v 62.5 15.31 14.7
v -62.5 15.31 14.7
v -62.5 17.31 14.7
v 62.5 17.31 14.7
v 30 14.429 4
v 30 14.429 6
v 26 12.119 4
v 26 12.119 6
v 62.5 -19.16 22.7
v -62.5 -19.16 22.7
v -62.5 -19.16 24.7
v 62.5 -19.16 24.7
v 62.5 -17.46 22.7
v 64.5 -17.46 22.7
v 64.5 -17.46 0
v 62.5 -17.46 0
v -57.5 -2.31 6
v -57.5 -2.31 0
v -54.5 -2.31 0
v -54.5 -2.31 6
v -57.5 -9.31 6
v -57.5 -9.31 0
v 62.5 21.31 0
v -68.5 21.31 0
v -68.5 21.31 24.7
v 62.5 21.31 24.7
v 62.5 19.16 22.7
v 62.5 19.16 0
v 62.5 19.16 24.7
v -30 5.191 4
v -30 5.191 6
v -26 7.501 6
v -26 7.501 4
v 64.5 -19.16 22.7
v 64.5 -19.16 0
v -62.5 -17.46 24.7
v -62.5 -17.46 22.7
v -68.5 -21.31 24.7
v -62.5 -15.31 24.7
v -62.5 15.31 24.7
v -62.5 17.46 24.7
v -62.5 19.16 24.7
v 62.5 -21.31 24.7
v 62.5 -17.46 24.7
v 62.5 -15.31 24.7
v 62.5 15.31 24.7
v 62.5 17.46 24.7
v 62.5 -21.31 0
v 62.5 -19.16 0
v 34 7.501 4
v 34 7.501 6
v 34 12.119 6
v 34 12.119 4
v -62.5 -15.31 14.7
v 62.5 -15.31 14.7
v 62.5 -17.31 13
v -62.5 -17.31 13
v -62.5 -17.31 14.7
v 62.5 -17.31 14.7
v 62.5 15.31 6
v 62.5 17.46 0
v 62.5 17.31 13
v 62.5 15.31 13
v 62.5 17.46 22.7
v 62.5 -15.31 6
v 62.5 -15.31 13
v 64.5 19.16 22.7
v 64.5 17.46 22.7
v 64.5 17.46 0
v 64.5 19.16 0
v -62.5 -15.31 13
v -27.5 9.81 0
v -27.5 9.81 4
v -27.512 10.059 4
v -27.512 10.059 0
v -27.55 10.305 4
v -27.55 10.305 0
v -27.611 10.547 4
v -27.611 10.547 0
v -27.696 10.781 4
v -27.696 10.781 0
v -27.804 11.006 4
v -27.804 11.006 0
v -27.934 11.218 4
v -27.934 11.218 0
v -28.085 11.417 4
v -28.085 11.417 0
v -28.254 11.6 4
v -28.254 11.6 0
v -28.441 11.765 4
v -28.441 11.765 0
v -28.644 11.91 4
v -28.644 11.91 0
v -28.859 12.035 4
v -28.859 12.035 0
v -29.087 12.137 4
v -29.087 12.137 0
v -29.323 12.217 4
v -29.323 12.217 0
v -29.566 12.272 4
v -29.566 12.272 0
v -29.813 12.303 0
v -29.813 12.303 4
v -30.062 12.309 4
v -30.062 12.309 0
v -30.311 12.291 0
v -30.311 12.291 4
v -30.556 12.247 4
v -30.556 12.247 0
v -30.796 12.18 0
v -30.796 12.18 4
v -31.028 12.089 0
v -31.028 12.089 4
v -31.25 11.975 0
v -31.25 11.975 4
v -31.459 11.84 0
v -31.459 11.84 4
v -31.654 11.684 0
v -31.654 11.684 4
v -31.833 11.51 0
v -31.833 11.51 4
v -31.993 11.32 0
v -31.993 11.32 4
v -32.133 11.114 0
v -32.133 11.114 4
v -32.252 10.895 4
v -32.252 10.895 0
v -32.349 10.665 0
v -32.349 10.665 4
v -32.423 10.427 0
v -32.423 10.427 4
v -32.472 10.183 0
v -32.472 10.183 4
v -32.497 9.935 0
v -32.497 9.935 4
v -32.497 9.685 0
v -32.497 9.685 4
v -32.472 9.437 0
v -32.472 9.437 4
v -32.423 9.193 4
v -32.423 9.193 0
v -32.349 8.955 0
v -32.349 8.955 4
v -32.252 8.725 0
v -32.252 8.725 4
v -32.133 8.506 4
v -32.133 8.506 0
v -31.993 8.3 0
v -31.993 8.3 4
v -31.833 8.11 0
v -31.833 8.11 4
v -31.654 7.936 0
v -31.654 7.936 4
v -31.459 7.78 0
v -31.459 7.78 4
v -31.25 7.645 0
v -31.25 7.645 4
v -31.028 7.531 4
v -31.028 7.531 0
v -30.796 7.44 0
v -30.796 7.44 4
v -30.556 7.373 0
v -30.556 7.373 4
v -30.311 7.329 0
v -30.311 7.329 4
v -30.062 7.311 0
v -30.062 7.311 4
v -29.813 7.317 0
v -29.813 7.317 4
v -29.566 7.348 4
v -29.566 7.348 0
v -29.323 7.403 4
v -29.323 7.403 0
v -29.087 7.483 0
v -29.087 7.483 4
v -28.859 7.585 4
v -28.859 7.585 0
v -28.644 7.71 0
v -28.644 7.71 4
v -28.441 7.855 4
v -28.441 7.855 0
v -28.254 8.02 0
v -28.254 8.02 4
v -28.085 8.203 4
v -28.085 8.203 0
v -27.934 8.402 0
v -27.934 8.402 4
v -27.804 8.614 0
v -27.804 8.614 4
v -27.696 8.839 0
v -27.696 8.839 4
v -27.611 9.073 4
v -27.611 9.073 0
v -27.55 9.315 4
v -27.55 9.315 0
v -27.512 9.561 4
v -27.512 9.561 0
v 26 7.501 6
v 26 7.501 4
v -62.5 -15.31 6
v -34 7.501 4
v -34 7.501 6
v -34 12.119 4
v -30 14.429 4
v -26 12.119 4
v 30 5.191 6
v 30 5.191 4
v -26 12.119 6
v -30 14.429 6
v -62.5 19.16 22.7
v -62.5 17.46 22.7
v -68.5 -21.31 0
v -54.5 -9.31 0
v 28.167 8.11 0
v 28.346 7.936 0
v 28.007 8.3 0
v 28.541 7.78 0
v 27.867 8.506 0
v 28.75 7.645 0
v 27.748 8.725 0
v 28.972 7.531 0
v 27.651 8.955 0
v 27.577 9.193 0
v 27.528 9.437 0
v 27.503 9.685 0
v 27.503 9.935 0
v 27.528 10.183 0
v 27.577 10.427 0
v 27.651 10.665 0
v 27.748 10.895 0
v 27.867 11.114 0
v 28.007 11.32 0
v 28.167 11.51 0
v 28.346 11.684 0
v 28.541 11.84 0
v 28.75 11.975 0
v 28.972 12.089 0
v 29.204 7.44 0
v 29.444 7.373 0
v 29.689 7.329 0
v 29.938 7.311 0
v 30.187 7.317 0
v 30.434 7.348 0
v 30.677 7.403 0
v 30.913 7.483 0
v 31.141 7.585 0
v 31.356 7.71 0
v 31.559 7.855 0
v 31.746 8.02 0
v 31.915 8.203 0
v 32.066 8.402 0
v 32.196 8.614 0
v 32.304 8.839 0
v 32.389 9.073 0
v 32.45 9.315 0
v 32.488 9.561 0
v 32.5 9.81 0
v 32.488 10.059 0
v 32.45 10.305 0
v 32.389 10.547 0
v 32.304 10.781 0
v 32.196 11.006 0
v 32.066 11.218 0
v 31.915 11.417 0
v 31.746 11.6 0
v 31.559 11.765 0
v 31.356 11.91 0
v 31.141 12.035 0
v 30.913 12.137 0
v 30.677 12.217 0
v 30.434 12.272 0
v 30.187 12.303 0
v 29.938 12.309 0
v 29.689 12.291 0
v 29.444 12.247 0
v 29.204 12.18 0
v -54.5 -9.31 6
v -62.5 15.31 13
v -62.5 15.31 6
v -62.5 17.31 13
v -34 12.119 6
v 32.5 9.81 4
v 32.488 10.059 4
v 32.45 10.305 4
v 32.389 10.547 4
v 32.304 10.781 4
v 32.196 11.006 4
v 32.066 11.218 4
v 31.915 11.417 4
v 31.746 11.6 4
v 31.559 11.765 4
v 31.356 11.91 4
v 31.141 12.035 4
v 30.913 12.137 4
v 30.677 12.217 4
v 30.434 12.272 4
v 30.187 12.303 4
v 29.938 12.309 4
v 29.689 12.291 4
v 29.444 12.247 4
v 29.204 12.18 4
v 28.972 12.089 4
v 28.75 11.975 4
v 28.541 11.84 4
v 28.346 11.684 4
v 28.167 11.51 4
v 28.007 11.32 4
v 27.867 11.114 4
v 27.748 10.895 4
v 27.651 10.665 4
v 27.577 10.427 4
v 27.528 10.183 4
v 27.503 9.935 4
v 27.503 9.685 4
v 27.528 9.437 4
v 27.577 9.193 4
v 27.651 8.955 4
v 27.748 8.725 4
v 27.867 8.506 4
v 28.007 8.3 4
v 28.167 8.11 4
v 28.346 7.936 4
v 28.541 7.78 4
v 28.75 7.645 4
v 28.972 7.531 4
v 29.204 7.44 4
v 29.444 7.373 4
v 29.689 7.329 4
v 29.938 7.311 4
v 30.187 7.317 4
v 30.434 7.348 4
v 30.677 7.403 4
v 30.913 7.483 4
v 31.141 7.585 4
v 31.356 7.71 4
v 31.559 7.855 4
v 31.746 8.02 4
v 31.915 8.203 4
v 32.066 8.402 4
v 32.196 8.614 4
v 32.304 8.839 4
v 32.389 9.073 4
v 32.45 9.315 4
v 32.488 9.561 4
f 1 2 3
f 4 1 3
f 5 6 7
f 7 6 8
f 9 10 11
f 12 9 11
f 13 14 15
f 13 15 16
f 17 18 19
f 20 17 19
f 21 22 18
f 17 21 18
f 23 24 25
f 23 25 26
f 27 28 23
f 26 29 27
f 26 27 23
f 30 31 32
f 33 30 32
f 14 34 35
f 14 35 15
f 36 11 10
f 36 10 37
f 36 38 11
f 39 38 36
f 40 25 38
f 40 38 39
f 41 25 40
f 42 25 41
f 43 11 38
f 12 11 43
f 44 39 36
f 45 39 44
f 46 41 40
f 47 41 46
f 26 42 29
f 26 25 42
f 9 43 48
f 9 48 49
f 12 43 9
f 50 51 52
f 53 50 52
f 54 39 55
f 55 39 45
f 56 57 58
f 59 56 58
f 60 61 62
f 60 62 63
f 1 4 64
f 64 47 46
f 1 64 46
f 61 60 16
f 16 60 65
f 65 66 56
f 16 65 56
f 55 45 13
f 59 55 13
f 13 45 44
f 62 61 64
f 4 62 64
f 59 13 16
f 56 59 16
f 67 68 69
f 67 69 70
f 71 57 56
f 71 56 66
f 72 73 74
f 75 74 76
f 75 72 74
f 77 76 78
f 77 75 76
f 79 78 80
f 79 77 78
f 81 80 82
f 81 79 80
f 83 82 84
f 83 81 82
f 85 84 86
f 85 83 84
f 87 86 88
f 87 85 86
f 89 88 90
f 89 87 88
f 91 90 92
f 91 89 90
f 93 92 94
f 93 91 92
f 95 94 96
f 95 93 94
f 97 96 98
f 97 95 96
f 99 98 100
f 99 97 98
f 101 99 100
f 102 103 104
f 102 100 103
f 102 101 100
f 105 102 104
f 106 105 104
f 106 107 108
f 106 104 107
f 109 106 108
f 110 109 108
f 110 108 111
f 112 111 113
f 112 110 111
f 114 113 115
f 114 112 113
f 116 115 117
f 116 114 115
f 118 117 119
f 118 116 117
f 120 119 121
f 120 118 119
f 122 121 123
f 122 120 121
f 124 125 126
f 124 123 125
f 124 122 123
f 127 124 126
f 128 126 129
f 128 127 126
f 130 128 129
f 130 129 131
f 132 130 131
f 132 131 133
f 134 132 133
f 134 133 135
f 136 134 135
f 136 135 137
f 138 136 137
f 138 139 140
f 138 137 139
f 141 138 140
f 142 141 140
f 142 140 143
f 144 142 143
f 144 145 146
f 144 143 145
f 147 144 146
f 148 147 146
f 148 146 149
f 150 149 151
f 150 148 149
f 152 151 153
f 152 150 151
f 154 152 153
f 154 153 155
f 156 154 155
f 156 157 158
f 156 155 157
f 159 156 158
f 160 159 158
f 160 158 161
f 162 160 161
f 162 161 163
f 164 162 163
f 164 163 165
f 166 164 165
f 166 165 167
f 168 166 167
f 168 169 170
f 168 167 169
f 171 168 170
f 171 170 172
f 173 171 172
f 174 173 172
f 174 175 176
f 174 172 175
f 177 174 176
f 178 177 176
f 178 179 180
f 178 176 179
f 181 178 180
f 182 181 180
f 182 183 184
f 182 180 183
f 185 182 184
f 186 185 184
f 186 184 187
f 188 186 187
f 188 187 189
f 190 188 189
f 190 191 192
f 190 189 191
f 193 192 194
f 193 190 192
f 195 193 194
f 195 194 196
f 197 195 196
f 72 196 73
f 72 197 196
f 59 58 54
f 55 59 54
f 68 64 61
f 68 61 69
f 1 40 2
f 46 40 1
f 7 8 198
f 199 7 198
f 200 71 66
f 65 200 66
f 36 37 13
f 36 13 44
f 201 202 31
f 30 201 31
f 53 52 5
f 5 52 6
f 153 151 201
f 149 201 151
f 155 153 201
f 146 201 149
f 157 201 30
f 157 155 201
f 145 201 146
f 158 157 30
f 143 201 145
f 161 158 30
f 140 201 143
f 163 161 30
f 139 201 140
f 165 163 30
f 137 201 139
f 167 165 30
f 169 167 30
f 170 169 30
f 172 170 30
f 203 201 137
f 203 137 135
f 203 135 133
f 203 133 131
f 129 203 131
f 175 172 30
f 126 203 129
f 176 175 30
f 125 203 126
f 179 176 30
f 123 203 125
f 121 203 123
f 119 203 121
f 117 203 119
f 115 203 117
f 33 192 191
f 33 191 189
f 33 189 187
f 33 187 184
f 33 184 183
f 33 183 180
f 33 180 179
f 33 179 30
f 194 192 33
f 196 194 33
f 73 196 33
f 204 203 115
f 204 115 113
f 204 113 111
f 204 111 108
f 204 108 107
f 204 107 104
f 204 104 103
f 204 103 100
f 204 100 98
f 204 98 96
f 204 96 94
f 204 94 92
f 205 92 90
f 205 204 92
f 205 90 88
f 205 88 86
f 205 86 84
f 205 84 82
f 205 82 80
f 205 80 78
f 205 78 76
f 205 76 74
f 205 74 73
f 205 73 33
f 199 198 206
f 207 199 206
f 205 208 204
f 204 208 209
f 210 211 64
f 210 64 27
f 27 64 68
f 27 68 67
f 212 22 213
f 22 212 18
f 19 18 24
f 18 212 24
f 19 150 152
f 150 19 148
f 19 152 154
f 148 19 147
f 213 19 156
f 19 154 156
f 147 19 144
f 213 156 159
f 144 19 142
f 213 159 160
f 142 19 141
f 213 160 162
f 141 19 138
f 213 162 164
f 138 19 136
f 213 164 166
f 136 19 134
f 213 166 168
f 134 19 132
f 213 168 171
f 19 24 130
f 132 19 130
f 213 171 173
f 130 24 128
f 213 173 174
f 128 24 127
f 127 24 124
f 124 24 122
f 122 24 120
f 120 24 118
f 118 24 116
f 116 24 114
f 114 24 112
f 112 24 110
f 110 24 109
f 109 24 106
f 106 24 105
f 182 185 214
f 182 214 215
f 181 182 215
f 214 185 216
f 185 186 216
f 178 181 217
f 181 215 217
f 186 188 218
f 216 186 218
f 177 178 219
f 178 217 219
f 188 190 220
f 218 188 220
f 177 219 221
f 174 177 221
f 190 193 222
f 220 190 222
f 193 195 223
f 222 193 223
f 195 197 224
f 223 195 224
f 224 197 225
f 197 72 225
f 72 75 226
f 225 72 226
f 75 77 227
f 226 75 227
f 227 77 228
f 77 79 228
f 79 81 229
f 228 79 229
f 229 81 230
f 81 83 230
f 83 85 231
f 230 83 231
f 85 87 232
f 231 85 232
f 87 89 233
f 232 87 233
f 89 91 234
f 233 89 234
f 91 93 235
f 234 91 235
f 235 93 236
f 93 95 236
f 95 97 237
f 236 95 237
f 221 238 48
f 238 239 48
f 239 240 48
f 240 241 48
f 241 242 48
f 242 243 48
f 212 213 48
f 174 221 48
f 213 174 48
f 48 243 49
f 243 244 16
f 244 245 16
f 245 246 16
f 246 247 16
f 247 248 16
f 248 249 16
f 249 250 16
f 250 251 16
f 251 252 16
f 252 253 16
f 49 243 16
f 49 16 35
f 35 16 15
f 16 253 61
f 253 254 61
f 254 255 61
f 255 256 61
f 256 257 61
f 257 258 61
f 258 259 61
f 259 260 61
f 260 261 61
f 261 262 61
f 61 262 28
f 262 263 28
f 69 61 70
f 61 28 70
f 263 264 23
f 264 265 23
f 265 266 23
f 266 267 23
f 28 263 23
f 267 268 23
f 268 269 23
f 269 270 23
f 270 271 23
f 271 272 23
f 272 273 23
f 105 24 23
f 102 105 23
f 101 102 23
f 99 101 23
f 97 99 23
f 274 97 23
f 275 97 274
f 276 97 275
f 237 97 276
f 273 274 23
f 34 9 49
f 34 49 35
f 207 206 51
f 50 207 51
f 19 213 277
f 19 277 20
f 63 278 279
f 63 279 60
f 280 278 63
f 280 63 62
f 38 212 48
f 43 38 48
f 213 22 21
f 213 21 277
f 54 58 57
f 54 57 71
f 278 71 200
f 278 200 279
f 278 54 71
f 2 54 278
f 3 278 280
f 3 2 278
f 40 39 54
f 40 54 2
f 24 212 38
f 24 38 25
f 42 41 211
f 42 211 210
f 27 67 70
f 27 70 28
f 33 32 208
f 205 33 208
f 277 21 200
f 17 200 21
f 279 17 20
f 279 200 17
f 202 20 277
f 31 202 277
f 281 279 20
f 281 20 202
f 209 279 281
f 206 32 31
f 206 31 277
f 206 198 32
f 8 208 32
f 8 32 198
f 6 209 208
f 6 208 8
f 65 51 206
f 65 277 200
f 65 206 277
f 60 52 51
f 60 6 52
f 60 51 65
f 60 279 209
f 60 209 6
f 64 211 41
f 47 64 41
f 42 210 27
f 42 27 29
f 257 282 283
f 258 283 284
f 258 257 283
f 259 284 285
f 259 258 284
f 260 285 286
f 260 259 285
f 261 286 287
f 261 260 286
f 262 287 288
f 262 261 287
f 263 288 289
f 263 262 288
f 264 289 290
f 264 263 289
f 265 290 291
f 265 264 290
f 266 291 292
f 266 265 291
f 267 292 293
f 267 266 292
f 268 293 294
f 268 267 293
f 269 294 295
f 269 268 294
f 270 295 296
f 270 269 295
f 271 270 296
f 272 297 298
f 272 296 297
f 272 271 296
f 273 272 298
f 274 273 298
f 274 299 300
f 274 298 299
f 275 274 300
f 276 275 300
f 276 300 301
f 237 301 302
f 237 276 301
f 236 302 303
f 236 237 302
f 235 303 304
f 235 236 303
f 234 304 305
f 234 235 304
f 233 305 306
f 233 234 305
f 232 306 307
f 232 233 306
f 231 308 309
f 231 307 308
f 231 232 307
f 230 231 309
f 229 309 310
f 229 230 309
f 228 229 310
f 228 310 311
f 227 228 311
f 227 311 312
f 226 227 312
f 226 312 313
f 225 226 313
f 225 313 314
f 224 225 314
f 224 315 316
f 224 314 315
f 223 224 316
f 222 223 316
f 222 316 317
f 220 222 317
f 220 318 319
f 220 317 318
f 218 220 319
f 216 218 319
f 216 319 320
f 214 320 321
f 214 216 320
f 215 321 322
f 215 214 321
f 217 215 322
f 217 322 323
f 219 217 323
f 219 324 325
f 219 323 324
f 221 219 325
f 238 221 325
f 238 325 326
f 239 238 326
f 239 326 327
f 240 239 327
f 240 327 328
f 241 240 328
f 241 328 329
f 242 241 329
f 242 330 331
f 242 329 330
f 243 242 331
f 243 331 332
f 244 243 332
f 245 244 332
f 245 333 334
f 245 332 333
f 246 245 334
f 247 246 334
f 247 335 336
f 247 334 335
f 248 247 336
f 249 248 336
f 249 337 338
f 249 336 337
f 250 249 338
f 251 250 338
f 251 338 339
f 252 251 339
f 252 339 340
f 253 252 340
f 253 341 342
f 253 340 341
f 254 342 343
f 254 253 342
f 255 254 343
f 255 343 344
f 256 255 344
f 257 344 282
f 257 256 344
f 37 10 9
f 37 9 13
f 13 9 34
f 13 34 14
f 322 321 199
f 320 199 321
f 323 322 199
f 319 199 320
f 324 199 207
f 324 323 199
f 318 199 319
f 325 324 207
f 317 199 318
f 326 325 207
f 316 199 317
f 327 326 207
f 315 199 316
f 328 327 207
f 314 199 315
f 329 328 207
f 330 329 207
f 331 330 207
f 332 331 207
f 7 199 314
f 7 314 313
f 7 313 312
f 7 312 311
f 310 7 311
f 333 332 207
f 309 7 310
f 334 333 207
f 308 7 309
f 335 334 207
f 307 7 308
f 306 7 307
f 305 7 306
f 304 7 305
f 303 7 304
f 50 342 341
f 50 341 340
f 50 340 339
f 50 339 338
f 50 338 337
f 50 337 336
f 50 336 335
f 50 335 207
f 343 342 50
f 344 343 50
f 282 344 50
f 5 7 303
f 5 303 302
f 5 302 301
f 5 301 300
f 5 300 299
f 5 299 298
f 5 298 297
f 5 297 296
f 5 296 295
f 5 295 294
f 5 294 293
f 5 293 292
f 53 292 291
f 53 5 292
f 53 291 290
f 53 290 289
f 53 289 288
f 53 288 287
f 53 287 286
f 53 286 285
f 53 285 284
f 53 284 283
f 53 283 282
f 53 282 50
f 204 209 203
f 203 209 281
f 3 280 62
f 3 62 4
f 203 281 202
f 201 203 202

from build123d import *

# Parameters (mm, degrees)
SKETCH_W        = 137
SKETCH_H        = 42.62
SKETCH_R        = 2.5
SKETCH_W_2      = 3
SKETCH_H_2      = 7
PAD_DEPTH       = 24.7
SKETCH001_W     = 125
SKETCH001_H     = 30.62
POCKET_DEPTH    = 18.7
POCKET001_DEPTH = 2
POCKET002_DEPTH = 24.7
SKETCH004_W     = 1.7
SKETCH004_H     = 2
SKETCH004_W_2   = 2
SKETCH004_H_2   = 1.7
POCKET003_DEPTH = 127


with BuildPart() as part:
    # Sketch → Pad (new body)
    with BuildSketch(Plane.XY):
        Rectangle(SKETCH_W, SKETCH_H)
        with Locations((30, 9.81)):
            Circle(SKETCH_R, mode=Mode.SUBTRACT)
        with Locations((-30, 9.81)):
            Circle(SKETCH_R, mode=Mode.SUBTRACT)
        with Locations((-56, -5.81)):
            Rectangle(SKETCH_W_2, SKETCH_H_2, mode=Mode.SUBTRACT)
    extrude(amount=PAD_DEPTH)

    # Sketch001 (on Face12 of Pad) → Pocket (cut)
    with BuildSketch(Plane.XY.offset(24.7)):
        Rectangle(SKETCH001_W, SKETCH001_H)
    extrude(amount=-POCKET_DEPTH, mode=Mode.SUBTRACT)

    # Sketch002 (on Face17 of Pocket) → Pocket001 (cut)
    with BuildSketch(Plane.XY.offset(6)):
        Polygon((-26, 7.500599), (-26, 12.119401), (-30, 14.428802), (-34, 12.119401), (-34, 7.500599), (-30, 5.191198), align=None)
        Polygon((34, 7.500599), (34, 12.119401), (30, 14.428802), (26, 12.119401), (26, 7.500599), (30, 5.191198), align=None)
    extrude(amount=-POCKET001_DEPTH, mode=Mode.SUBTRACT)

    # Sketch003 (on Face5 of Pocket001) → Pocket002 (cut)
    with BuildSketch(Plane.XY.offset(24.7)):
        Polygon((62.5, 21.31), (68.5, 21.31), (68.5, -21.31), (62.5, -21.31), (62.5, -19.16), (64.5, -19.16), (64.5, -17.46), (62.5, -17.46), (62.5, -15.31), (62.5, 15.31), (62.5, 17.46), (64.5, 17.46), (64.5, 19.16), (62.5, 19.16), align=None)
    extrude(amount=-POCKET002_DEPTH, mode=Mode.SUBTRACT)

    # Sketch004 (on Face9 of Pocket002) → Pocket003 (cut)
    with BuildSketch(Plane.YZ.offset(64.5)):
        with Locations((-18.31, 23.7)):
            Rectangle(SKETCH004_W, SKETCH004_H)
        with Locations((18.31, 23.7)):
            Rectangle(SKETCH004_W, SKETCH004_H)
        with Locations((-16.31, 13.85)):
            Rectangle(SKETCH004_W_2, SKETCH004_H_2)
        with Locations((16.31, 13.85)):
            Rectangle(SKETCH004_W_2, SKETCH004_H_2)
    extrude(amount=-POCKET003_DEPTH, mode=Mode.SUBTRACT)


solid = part.part
